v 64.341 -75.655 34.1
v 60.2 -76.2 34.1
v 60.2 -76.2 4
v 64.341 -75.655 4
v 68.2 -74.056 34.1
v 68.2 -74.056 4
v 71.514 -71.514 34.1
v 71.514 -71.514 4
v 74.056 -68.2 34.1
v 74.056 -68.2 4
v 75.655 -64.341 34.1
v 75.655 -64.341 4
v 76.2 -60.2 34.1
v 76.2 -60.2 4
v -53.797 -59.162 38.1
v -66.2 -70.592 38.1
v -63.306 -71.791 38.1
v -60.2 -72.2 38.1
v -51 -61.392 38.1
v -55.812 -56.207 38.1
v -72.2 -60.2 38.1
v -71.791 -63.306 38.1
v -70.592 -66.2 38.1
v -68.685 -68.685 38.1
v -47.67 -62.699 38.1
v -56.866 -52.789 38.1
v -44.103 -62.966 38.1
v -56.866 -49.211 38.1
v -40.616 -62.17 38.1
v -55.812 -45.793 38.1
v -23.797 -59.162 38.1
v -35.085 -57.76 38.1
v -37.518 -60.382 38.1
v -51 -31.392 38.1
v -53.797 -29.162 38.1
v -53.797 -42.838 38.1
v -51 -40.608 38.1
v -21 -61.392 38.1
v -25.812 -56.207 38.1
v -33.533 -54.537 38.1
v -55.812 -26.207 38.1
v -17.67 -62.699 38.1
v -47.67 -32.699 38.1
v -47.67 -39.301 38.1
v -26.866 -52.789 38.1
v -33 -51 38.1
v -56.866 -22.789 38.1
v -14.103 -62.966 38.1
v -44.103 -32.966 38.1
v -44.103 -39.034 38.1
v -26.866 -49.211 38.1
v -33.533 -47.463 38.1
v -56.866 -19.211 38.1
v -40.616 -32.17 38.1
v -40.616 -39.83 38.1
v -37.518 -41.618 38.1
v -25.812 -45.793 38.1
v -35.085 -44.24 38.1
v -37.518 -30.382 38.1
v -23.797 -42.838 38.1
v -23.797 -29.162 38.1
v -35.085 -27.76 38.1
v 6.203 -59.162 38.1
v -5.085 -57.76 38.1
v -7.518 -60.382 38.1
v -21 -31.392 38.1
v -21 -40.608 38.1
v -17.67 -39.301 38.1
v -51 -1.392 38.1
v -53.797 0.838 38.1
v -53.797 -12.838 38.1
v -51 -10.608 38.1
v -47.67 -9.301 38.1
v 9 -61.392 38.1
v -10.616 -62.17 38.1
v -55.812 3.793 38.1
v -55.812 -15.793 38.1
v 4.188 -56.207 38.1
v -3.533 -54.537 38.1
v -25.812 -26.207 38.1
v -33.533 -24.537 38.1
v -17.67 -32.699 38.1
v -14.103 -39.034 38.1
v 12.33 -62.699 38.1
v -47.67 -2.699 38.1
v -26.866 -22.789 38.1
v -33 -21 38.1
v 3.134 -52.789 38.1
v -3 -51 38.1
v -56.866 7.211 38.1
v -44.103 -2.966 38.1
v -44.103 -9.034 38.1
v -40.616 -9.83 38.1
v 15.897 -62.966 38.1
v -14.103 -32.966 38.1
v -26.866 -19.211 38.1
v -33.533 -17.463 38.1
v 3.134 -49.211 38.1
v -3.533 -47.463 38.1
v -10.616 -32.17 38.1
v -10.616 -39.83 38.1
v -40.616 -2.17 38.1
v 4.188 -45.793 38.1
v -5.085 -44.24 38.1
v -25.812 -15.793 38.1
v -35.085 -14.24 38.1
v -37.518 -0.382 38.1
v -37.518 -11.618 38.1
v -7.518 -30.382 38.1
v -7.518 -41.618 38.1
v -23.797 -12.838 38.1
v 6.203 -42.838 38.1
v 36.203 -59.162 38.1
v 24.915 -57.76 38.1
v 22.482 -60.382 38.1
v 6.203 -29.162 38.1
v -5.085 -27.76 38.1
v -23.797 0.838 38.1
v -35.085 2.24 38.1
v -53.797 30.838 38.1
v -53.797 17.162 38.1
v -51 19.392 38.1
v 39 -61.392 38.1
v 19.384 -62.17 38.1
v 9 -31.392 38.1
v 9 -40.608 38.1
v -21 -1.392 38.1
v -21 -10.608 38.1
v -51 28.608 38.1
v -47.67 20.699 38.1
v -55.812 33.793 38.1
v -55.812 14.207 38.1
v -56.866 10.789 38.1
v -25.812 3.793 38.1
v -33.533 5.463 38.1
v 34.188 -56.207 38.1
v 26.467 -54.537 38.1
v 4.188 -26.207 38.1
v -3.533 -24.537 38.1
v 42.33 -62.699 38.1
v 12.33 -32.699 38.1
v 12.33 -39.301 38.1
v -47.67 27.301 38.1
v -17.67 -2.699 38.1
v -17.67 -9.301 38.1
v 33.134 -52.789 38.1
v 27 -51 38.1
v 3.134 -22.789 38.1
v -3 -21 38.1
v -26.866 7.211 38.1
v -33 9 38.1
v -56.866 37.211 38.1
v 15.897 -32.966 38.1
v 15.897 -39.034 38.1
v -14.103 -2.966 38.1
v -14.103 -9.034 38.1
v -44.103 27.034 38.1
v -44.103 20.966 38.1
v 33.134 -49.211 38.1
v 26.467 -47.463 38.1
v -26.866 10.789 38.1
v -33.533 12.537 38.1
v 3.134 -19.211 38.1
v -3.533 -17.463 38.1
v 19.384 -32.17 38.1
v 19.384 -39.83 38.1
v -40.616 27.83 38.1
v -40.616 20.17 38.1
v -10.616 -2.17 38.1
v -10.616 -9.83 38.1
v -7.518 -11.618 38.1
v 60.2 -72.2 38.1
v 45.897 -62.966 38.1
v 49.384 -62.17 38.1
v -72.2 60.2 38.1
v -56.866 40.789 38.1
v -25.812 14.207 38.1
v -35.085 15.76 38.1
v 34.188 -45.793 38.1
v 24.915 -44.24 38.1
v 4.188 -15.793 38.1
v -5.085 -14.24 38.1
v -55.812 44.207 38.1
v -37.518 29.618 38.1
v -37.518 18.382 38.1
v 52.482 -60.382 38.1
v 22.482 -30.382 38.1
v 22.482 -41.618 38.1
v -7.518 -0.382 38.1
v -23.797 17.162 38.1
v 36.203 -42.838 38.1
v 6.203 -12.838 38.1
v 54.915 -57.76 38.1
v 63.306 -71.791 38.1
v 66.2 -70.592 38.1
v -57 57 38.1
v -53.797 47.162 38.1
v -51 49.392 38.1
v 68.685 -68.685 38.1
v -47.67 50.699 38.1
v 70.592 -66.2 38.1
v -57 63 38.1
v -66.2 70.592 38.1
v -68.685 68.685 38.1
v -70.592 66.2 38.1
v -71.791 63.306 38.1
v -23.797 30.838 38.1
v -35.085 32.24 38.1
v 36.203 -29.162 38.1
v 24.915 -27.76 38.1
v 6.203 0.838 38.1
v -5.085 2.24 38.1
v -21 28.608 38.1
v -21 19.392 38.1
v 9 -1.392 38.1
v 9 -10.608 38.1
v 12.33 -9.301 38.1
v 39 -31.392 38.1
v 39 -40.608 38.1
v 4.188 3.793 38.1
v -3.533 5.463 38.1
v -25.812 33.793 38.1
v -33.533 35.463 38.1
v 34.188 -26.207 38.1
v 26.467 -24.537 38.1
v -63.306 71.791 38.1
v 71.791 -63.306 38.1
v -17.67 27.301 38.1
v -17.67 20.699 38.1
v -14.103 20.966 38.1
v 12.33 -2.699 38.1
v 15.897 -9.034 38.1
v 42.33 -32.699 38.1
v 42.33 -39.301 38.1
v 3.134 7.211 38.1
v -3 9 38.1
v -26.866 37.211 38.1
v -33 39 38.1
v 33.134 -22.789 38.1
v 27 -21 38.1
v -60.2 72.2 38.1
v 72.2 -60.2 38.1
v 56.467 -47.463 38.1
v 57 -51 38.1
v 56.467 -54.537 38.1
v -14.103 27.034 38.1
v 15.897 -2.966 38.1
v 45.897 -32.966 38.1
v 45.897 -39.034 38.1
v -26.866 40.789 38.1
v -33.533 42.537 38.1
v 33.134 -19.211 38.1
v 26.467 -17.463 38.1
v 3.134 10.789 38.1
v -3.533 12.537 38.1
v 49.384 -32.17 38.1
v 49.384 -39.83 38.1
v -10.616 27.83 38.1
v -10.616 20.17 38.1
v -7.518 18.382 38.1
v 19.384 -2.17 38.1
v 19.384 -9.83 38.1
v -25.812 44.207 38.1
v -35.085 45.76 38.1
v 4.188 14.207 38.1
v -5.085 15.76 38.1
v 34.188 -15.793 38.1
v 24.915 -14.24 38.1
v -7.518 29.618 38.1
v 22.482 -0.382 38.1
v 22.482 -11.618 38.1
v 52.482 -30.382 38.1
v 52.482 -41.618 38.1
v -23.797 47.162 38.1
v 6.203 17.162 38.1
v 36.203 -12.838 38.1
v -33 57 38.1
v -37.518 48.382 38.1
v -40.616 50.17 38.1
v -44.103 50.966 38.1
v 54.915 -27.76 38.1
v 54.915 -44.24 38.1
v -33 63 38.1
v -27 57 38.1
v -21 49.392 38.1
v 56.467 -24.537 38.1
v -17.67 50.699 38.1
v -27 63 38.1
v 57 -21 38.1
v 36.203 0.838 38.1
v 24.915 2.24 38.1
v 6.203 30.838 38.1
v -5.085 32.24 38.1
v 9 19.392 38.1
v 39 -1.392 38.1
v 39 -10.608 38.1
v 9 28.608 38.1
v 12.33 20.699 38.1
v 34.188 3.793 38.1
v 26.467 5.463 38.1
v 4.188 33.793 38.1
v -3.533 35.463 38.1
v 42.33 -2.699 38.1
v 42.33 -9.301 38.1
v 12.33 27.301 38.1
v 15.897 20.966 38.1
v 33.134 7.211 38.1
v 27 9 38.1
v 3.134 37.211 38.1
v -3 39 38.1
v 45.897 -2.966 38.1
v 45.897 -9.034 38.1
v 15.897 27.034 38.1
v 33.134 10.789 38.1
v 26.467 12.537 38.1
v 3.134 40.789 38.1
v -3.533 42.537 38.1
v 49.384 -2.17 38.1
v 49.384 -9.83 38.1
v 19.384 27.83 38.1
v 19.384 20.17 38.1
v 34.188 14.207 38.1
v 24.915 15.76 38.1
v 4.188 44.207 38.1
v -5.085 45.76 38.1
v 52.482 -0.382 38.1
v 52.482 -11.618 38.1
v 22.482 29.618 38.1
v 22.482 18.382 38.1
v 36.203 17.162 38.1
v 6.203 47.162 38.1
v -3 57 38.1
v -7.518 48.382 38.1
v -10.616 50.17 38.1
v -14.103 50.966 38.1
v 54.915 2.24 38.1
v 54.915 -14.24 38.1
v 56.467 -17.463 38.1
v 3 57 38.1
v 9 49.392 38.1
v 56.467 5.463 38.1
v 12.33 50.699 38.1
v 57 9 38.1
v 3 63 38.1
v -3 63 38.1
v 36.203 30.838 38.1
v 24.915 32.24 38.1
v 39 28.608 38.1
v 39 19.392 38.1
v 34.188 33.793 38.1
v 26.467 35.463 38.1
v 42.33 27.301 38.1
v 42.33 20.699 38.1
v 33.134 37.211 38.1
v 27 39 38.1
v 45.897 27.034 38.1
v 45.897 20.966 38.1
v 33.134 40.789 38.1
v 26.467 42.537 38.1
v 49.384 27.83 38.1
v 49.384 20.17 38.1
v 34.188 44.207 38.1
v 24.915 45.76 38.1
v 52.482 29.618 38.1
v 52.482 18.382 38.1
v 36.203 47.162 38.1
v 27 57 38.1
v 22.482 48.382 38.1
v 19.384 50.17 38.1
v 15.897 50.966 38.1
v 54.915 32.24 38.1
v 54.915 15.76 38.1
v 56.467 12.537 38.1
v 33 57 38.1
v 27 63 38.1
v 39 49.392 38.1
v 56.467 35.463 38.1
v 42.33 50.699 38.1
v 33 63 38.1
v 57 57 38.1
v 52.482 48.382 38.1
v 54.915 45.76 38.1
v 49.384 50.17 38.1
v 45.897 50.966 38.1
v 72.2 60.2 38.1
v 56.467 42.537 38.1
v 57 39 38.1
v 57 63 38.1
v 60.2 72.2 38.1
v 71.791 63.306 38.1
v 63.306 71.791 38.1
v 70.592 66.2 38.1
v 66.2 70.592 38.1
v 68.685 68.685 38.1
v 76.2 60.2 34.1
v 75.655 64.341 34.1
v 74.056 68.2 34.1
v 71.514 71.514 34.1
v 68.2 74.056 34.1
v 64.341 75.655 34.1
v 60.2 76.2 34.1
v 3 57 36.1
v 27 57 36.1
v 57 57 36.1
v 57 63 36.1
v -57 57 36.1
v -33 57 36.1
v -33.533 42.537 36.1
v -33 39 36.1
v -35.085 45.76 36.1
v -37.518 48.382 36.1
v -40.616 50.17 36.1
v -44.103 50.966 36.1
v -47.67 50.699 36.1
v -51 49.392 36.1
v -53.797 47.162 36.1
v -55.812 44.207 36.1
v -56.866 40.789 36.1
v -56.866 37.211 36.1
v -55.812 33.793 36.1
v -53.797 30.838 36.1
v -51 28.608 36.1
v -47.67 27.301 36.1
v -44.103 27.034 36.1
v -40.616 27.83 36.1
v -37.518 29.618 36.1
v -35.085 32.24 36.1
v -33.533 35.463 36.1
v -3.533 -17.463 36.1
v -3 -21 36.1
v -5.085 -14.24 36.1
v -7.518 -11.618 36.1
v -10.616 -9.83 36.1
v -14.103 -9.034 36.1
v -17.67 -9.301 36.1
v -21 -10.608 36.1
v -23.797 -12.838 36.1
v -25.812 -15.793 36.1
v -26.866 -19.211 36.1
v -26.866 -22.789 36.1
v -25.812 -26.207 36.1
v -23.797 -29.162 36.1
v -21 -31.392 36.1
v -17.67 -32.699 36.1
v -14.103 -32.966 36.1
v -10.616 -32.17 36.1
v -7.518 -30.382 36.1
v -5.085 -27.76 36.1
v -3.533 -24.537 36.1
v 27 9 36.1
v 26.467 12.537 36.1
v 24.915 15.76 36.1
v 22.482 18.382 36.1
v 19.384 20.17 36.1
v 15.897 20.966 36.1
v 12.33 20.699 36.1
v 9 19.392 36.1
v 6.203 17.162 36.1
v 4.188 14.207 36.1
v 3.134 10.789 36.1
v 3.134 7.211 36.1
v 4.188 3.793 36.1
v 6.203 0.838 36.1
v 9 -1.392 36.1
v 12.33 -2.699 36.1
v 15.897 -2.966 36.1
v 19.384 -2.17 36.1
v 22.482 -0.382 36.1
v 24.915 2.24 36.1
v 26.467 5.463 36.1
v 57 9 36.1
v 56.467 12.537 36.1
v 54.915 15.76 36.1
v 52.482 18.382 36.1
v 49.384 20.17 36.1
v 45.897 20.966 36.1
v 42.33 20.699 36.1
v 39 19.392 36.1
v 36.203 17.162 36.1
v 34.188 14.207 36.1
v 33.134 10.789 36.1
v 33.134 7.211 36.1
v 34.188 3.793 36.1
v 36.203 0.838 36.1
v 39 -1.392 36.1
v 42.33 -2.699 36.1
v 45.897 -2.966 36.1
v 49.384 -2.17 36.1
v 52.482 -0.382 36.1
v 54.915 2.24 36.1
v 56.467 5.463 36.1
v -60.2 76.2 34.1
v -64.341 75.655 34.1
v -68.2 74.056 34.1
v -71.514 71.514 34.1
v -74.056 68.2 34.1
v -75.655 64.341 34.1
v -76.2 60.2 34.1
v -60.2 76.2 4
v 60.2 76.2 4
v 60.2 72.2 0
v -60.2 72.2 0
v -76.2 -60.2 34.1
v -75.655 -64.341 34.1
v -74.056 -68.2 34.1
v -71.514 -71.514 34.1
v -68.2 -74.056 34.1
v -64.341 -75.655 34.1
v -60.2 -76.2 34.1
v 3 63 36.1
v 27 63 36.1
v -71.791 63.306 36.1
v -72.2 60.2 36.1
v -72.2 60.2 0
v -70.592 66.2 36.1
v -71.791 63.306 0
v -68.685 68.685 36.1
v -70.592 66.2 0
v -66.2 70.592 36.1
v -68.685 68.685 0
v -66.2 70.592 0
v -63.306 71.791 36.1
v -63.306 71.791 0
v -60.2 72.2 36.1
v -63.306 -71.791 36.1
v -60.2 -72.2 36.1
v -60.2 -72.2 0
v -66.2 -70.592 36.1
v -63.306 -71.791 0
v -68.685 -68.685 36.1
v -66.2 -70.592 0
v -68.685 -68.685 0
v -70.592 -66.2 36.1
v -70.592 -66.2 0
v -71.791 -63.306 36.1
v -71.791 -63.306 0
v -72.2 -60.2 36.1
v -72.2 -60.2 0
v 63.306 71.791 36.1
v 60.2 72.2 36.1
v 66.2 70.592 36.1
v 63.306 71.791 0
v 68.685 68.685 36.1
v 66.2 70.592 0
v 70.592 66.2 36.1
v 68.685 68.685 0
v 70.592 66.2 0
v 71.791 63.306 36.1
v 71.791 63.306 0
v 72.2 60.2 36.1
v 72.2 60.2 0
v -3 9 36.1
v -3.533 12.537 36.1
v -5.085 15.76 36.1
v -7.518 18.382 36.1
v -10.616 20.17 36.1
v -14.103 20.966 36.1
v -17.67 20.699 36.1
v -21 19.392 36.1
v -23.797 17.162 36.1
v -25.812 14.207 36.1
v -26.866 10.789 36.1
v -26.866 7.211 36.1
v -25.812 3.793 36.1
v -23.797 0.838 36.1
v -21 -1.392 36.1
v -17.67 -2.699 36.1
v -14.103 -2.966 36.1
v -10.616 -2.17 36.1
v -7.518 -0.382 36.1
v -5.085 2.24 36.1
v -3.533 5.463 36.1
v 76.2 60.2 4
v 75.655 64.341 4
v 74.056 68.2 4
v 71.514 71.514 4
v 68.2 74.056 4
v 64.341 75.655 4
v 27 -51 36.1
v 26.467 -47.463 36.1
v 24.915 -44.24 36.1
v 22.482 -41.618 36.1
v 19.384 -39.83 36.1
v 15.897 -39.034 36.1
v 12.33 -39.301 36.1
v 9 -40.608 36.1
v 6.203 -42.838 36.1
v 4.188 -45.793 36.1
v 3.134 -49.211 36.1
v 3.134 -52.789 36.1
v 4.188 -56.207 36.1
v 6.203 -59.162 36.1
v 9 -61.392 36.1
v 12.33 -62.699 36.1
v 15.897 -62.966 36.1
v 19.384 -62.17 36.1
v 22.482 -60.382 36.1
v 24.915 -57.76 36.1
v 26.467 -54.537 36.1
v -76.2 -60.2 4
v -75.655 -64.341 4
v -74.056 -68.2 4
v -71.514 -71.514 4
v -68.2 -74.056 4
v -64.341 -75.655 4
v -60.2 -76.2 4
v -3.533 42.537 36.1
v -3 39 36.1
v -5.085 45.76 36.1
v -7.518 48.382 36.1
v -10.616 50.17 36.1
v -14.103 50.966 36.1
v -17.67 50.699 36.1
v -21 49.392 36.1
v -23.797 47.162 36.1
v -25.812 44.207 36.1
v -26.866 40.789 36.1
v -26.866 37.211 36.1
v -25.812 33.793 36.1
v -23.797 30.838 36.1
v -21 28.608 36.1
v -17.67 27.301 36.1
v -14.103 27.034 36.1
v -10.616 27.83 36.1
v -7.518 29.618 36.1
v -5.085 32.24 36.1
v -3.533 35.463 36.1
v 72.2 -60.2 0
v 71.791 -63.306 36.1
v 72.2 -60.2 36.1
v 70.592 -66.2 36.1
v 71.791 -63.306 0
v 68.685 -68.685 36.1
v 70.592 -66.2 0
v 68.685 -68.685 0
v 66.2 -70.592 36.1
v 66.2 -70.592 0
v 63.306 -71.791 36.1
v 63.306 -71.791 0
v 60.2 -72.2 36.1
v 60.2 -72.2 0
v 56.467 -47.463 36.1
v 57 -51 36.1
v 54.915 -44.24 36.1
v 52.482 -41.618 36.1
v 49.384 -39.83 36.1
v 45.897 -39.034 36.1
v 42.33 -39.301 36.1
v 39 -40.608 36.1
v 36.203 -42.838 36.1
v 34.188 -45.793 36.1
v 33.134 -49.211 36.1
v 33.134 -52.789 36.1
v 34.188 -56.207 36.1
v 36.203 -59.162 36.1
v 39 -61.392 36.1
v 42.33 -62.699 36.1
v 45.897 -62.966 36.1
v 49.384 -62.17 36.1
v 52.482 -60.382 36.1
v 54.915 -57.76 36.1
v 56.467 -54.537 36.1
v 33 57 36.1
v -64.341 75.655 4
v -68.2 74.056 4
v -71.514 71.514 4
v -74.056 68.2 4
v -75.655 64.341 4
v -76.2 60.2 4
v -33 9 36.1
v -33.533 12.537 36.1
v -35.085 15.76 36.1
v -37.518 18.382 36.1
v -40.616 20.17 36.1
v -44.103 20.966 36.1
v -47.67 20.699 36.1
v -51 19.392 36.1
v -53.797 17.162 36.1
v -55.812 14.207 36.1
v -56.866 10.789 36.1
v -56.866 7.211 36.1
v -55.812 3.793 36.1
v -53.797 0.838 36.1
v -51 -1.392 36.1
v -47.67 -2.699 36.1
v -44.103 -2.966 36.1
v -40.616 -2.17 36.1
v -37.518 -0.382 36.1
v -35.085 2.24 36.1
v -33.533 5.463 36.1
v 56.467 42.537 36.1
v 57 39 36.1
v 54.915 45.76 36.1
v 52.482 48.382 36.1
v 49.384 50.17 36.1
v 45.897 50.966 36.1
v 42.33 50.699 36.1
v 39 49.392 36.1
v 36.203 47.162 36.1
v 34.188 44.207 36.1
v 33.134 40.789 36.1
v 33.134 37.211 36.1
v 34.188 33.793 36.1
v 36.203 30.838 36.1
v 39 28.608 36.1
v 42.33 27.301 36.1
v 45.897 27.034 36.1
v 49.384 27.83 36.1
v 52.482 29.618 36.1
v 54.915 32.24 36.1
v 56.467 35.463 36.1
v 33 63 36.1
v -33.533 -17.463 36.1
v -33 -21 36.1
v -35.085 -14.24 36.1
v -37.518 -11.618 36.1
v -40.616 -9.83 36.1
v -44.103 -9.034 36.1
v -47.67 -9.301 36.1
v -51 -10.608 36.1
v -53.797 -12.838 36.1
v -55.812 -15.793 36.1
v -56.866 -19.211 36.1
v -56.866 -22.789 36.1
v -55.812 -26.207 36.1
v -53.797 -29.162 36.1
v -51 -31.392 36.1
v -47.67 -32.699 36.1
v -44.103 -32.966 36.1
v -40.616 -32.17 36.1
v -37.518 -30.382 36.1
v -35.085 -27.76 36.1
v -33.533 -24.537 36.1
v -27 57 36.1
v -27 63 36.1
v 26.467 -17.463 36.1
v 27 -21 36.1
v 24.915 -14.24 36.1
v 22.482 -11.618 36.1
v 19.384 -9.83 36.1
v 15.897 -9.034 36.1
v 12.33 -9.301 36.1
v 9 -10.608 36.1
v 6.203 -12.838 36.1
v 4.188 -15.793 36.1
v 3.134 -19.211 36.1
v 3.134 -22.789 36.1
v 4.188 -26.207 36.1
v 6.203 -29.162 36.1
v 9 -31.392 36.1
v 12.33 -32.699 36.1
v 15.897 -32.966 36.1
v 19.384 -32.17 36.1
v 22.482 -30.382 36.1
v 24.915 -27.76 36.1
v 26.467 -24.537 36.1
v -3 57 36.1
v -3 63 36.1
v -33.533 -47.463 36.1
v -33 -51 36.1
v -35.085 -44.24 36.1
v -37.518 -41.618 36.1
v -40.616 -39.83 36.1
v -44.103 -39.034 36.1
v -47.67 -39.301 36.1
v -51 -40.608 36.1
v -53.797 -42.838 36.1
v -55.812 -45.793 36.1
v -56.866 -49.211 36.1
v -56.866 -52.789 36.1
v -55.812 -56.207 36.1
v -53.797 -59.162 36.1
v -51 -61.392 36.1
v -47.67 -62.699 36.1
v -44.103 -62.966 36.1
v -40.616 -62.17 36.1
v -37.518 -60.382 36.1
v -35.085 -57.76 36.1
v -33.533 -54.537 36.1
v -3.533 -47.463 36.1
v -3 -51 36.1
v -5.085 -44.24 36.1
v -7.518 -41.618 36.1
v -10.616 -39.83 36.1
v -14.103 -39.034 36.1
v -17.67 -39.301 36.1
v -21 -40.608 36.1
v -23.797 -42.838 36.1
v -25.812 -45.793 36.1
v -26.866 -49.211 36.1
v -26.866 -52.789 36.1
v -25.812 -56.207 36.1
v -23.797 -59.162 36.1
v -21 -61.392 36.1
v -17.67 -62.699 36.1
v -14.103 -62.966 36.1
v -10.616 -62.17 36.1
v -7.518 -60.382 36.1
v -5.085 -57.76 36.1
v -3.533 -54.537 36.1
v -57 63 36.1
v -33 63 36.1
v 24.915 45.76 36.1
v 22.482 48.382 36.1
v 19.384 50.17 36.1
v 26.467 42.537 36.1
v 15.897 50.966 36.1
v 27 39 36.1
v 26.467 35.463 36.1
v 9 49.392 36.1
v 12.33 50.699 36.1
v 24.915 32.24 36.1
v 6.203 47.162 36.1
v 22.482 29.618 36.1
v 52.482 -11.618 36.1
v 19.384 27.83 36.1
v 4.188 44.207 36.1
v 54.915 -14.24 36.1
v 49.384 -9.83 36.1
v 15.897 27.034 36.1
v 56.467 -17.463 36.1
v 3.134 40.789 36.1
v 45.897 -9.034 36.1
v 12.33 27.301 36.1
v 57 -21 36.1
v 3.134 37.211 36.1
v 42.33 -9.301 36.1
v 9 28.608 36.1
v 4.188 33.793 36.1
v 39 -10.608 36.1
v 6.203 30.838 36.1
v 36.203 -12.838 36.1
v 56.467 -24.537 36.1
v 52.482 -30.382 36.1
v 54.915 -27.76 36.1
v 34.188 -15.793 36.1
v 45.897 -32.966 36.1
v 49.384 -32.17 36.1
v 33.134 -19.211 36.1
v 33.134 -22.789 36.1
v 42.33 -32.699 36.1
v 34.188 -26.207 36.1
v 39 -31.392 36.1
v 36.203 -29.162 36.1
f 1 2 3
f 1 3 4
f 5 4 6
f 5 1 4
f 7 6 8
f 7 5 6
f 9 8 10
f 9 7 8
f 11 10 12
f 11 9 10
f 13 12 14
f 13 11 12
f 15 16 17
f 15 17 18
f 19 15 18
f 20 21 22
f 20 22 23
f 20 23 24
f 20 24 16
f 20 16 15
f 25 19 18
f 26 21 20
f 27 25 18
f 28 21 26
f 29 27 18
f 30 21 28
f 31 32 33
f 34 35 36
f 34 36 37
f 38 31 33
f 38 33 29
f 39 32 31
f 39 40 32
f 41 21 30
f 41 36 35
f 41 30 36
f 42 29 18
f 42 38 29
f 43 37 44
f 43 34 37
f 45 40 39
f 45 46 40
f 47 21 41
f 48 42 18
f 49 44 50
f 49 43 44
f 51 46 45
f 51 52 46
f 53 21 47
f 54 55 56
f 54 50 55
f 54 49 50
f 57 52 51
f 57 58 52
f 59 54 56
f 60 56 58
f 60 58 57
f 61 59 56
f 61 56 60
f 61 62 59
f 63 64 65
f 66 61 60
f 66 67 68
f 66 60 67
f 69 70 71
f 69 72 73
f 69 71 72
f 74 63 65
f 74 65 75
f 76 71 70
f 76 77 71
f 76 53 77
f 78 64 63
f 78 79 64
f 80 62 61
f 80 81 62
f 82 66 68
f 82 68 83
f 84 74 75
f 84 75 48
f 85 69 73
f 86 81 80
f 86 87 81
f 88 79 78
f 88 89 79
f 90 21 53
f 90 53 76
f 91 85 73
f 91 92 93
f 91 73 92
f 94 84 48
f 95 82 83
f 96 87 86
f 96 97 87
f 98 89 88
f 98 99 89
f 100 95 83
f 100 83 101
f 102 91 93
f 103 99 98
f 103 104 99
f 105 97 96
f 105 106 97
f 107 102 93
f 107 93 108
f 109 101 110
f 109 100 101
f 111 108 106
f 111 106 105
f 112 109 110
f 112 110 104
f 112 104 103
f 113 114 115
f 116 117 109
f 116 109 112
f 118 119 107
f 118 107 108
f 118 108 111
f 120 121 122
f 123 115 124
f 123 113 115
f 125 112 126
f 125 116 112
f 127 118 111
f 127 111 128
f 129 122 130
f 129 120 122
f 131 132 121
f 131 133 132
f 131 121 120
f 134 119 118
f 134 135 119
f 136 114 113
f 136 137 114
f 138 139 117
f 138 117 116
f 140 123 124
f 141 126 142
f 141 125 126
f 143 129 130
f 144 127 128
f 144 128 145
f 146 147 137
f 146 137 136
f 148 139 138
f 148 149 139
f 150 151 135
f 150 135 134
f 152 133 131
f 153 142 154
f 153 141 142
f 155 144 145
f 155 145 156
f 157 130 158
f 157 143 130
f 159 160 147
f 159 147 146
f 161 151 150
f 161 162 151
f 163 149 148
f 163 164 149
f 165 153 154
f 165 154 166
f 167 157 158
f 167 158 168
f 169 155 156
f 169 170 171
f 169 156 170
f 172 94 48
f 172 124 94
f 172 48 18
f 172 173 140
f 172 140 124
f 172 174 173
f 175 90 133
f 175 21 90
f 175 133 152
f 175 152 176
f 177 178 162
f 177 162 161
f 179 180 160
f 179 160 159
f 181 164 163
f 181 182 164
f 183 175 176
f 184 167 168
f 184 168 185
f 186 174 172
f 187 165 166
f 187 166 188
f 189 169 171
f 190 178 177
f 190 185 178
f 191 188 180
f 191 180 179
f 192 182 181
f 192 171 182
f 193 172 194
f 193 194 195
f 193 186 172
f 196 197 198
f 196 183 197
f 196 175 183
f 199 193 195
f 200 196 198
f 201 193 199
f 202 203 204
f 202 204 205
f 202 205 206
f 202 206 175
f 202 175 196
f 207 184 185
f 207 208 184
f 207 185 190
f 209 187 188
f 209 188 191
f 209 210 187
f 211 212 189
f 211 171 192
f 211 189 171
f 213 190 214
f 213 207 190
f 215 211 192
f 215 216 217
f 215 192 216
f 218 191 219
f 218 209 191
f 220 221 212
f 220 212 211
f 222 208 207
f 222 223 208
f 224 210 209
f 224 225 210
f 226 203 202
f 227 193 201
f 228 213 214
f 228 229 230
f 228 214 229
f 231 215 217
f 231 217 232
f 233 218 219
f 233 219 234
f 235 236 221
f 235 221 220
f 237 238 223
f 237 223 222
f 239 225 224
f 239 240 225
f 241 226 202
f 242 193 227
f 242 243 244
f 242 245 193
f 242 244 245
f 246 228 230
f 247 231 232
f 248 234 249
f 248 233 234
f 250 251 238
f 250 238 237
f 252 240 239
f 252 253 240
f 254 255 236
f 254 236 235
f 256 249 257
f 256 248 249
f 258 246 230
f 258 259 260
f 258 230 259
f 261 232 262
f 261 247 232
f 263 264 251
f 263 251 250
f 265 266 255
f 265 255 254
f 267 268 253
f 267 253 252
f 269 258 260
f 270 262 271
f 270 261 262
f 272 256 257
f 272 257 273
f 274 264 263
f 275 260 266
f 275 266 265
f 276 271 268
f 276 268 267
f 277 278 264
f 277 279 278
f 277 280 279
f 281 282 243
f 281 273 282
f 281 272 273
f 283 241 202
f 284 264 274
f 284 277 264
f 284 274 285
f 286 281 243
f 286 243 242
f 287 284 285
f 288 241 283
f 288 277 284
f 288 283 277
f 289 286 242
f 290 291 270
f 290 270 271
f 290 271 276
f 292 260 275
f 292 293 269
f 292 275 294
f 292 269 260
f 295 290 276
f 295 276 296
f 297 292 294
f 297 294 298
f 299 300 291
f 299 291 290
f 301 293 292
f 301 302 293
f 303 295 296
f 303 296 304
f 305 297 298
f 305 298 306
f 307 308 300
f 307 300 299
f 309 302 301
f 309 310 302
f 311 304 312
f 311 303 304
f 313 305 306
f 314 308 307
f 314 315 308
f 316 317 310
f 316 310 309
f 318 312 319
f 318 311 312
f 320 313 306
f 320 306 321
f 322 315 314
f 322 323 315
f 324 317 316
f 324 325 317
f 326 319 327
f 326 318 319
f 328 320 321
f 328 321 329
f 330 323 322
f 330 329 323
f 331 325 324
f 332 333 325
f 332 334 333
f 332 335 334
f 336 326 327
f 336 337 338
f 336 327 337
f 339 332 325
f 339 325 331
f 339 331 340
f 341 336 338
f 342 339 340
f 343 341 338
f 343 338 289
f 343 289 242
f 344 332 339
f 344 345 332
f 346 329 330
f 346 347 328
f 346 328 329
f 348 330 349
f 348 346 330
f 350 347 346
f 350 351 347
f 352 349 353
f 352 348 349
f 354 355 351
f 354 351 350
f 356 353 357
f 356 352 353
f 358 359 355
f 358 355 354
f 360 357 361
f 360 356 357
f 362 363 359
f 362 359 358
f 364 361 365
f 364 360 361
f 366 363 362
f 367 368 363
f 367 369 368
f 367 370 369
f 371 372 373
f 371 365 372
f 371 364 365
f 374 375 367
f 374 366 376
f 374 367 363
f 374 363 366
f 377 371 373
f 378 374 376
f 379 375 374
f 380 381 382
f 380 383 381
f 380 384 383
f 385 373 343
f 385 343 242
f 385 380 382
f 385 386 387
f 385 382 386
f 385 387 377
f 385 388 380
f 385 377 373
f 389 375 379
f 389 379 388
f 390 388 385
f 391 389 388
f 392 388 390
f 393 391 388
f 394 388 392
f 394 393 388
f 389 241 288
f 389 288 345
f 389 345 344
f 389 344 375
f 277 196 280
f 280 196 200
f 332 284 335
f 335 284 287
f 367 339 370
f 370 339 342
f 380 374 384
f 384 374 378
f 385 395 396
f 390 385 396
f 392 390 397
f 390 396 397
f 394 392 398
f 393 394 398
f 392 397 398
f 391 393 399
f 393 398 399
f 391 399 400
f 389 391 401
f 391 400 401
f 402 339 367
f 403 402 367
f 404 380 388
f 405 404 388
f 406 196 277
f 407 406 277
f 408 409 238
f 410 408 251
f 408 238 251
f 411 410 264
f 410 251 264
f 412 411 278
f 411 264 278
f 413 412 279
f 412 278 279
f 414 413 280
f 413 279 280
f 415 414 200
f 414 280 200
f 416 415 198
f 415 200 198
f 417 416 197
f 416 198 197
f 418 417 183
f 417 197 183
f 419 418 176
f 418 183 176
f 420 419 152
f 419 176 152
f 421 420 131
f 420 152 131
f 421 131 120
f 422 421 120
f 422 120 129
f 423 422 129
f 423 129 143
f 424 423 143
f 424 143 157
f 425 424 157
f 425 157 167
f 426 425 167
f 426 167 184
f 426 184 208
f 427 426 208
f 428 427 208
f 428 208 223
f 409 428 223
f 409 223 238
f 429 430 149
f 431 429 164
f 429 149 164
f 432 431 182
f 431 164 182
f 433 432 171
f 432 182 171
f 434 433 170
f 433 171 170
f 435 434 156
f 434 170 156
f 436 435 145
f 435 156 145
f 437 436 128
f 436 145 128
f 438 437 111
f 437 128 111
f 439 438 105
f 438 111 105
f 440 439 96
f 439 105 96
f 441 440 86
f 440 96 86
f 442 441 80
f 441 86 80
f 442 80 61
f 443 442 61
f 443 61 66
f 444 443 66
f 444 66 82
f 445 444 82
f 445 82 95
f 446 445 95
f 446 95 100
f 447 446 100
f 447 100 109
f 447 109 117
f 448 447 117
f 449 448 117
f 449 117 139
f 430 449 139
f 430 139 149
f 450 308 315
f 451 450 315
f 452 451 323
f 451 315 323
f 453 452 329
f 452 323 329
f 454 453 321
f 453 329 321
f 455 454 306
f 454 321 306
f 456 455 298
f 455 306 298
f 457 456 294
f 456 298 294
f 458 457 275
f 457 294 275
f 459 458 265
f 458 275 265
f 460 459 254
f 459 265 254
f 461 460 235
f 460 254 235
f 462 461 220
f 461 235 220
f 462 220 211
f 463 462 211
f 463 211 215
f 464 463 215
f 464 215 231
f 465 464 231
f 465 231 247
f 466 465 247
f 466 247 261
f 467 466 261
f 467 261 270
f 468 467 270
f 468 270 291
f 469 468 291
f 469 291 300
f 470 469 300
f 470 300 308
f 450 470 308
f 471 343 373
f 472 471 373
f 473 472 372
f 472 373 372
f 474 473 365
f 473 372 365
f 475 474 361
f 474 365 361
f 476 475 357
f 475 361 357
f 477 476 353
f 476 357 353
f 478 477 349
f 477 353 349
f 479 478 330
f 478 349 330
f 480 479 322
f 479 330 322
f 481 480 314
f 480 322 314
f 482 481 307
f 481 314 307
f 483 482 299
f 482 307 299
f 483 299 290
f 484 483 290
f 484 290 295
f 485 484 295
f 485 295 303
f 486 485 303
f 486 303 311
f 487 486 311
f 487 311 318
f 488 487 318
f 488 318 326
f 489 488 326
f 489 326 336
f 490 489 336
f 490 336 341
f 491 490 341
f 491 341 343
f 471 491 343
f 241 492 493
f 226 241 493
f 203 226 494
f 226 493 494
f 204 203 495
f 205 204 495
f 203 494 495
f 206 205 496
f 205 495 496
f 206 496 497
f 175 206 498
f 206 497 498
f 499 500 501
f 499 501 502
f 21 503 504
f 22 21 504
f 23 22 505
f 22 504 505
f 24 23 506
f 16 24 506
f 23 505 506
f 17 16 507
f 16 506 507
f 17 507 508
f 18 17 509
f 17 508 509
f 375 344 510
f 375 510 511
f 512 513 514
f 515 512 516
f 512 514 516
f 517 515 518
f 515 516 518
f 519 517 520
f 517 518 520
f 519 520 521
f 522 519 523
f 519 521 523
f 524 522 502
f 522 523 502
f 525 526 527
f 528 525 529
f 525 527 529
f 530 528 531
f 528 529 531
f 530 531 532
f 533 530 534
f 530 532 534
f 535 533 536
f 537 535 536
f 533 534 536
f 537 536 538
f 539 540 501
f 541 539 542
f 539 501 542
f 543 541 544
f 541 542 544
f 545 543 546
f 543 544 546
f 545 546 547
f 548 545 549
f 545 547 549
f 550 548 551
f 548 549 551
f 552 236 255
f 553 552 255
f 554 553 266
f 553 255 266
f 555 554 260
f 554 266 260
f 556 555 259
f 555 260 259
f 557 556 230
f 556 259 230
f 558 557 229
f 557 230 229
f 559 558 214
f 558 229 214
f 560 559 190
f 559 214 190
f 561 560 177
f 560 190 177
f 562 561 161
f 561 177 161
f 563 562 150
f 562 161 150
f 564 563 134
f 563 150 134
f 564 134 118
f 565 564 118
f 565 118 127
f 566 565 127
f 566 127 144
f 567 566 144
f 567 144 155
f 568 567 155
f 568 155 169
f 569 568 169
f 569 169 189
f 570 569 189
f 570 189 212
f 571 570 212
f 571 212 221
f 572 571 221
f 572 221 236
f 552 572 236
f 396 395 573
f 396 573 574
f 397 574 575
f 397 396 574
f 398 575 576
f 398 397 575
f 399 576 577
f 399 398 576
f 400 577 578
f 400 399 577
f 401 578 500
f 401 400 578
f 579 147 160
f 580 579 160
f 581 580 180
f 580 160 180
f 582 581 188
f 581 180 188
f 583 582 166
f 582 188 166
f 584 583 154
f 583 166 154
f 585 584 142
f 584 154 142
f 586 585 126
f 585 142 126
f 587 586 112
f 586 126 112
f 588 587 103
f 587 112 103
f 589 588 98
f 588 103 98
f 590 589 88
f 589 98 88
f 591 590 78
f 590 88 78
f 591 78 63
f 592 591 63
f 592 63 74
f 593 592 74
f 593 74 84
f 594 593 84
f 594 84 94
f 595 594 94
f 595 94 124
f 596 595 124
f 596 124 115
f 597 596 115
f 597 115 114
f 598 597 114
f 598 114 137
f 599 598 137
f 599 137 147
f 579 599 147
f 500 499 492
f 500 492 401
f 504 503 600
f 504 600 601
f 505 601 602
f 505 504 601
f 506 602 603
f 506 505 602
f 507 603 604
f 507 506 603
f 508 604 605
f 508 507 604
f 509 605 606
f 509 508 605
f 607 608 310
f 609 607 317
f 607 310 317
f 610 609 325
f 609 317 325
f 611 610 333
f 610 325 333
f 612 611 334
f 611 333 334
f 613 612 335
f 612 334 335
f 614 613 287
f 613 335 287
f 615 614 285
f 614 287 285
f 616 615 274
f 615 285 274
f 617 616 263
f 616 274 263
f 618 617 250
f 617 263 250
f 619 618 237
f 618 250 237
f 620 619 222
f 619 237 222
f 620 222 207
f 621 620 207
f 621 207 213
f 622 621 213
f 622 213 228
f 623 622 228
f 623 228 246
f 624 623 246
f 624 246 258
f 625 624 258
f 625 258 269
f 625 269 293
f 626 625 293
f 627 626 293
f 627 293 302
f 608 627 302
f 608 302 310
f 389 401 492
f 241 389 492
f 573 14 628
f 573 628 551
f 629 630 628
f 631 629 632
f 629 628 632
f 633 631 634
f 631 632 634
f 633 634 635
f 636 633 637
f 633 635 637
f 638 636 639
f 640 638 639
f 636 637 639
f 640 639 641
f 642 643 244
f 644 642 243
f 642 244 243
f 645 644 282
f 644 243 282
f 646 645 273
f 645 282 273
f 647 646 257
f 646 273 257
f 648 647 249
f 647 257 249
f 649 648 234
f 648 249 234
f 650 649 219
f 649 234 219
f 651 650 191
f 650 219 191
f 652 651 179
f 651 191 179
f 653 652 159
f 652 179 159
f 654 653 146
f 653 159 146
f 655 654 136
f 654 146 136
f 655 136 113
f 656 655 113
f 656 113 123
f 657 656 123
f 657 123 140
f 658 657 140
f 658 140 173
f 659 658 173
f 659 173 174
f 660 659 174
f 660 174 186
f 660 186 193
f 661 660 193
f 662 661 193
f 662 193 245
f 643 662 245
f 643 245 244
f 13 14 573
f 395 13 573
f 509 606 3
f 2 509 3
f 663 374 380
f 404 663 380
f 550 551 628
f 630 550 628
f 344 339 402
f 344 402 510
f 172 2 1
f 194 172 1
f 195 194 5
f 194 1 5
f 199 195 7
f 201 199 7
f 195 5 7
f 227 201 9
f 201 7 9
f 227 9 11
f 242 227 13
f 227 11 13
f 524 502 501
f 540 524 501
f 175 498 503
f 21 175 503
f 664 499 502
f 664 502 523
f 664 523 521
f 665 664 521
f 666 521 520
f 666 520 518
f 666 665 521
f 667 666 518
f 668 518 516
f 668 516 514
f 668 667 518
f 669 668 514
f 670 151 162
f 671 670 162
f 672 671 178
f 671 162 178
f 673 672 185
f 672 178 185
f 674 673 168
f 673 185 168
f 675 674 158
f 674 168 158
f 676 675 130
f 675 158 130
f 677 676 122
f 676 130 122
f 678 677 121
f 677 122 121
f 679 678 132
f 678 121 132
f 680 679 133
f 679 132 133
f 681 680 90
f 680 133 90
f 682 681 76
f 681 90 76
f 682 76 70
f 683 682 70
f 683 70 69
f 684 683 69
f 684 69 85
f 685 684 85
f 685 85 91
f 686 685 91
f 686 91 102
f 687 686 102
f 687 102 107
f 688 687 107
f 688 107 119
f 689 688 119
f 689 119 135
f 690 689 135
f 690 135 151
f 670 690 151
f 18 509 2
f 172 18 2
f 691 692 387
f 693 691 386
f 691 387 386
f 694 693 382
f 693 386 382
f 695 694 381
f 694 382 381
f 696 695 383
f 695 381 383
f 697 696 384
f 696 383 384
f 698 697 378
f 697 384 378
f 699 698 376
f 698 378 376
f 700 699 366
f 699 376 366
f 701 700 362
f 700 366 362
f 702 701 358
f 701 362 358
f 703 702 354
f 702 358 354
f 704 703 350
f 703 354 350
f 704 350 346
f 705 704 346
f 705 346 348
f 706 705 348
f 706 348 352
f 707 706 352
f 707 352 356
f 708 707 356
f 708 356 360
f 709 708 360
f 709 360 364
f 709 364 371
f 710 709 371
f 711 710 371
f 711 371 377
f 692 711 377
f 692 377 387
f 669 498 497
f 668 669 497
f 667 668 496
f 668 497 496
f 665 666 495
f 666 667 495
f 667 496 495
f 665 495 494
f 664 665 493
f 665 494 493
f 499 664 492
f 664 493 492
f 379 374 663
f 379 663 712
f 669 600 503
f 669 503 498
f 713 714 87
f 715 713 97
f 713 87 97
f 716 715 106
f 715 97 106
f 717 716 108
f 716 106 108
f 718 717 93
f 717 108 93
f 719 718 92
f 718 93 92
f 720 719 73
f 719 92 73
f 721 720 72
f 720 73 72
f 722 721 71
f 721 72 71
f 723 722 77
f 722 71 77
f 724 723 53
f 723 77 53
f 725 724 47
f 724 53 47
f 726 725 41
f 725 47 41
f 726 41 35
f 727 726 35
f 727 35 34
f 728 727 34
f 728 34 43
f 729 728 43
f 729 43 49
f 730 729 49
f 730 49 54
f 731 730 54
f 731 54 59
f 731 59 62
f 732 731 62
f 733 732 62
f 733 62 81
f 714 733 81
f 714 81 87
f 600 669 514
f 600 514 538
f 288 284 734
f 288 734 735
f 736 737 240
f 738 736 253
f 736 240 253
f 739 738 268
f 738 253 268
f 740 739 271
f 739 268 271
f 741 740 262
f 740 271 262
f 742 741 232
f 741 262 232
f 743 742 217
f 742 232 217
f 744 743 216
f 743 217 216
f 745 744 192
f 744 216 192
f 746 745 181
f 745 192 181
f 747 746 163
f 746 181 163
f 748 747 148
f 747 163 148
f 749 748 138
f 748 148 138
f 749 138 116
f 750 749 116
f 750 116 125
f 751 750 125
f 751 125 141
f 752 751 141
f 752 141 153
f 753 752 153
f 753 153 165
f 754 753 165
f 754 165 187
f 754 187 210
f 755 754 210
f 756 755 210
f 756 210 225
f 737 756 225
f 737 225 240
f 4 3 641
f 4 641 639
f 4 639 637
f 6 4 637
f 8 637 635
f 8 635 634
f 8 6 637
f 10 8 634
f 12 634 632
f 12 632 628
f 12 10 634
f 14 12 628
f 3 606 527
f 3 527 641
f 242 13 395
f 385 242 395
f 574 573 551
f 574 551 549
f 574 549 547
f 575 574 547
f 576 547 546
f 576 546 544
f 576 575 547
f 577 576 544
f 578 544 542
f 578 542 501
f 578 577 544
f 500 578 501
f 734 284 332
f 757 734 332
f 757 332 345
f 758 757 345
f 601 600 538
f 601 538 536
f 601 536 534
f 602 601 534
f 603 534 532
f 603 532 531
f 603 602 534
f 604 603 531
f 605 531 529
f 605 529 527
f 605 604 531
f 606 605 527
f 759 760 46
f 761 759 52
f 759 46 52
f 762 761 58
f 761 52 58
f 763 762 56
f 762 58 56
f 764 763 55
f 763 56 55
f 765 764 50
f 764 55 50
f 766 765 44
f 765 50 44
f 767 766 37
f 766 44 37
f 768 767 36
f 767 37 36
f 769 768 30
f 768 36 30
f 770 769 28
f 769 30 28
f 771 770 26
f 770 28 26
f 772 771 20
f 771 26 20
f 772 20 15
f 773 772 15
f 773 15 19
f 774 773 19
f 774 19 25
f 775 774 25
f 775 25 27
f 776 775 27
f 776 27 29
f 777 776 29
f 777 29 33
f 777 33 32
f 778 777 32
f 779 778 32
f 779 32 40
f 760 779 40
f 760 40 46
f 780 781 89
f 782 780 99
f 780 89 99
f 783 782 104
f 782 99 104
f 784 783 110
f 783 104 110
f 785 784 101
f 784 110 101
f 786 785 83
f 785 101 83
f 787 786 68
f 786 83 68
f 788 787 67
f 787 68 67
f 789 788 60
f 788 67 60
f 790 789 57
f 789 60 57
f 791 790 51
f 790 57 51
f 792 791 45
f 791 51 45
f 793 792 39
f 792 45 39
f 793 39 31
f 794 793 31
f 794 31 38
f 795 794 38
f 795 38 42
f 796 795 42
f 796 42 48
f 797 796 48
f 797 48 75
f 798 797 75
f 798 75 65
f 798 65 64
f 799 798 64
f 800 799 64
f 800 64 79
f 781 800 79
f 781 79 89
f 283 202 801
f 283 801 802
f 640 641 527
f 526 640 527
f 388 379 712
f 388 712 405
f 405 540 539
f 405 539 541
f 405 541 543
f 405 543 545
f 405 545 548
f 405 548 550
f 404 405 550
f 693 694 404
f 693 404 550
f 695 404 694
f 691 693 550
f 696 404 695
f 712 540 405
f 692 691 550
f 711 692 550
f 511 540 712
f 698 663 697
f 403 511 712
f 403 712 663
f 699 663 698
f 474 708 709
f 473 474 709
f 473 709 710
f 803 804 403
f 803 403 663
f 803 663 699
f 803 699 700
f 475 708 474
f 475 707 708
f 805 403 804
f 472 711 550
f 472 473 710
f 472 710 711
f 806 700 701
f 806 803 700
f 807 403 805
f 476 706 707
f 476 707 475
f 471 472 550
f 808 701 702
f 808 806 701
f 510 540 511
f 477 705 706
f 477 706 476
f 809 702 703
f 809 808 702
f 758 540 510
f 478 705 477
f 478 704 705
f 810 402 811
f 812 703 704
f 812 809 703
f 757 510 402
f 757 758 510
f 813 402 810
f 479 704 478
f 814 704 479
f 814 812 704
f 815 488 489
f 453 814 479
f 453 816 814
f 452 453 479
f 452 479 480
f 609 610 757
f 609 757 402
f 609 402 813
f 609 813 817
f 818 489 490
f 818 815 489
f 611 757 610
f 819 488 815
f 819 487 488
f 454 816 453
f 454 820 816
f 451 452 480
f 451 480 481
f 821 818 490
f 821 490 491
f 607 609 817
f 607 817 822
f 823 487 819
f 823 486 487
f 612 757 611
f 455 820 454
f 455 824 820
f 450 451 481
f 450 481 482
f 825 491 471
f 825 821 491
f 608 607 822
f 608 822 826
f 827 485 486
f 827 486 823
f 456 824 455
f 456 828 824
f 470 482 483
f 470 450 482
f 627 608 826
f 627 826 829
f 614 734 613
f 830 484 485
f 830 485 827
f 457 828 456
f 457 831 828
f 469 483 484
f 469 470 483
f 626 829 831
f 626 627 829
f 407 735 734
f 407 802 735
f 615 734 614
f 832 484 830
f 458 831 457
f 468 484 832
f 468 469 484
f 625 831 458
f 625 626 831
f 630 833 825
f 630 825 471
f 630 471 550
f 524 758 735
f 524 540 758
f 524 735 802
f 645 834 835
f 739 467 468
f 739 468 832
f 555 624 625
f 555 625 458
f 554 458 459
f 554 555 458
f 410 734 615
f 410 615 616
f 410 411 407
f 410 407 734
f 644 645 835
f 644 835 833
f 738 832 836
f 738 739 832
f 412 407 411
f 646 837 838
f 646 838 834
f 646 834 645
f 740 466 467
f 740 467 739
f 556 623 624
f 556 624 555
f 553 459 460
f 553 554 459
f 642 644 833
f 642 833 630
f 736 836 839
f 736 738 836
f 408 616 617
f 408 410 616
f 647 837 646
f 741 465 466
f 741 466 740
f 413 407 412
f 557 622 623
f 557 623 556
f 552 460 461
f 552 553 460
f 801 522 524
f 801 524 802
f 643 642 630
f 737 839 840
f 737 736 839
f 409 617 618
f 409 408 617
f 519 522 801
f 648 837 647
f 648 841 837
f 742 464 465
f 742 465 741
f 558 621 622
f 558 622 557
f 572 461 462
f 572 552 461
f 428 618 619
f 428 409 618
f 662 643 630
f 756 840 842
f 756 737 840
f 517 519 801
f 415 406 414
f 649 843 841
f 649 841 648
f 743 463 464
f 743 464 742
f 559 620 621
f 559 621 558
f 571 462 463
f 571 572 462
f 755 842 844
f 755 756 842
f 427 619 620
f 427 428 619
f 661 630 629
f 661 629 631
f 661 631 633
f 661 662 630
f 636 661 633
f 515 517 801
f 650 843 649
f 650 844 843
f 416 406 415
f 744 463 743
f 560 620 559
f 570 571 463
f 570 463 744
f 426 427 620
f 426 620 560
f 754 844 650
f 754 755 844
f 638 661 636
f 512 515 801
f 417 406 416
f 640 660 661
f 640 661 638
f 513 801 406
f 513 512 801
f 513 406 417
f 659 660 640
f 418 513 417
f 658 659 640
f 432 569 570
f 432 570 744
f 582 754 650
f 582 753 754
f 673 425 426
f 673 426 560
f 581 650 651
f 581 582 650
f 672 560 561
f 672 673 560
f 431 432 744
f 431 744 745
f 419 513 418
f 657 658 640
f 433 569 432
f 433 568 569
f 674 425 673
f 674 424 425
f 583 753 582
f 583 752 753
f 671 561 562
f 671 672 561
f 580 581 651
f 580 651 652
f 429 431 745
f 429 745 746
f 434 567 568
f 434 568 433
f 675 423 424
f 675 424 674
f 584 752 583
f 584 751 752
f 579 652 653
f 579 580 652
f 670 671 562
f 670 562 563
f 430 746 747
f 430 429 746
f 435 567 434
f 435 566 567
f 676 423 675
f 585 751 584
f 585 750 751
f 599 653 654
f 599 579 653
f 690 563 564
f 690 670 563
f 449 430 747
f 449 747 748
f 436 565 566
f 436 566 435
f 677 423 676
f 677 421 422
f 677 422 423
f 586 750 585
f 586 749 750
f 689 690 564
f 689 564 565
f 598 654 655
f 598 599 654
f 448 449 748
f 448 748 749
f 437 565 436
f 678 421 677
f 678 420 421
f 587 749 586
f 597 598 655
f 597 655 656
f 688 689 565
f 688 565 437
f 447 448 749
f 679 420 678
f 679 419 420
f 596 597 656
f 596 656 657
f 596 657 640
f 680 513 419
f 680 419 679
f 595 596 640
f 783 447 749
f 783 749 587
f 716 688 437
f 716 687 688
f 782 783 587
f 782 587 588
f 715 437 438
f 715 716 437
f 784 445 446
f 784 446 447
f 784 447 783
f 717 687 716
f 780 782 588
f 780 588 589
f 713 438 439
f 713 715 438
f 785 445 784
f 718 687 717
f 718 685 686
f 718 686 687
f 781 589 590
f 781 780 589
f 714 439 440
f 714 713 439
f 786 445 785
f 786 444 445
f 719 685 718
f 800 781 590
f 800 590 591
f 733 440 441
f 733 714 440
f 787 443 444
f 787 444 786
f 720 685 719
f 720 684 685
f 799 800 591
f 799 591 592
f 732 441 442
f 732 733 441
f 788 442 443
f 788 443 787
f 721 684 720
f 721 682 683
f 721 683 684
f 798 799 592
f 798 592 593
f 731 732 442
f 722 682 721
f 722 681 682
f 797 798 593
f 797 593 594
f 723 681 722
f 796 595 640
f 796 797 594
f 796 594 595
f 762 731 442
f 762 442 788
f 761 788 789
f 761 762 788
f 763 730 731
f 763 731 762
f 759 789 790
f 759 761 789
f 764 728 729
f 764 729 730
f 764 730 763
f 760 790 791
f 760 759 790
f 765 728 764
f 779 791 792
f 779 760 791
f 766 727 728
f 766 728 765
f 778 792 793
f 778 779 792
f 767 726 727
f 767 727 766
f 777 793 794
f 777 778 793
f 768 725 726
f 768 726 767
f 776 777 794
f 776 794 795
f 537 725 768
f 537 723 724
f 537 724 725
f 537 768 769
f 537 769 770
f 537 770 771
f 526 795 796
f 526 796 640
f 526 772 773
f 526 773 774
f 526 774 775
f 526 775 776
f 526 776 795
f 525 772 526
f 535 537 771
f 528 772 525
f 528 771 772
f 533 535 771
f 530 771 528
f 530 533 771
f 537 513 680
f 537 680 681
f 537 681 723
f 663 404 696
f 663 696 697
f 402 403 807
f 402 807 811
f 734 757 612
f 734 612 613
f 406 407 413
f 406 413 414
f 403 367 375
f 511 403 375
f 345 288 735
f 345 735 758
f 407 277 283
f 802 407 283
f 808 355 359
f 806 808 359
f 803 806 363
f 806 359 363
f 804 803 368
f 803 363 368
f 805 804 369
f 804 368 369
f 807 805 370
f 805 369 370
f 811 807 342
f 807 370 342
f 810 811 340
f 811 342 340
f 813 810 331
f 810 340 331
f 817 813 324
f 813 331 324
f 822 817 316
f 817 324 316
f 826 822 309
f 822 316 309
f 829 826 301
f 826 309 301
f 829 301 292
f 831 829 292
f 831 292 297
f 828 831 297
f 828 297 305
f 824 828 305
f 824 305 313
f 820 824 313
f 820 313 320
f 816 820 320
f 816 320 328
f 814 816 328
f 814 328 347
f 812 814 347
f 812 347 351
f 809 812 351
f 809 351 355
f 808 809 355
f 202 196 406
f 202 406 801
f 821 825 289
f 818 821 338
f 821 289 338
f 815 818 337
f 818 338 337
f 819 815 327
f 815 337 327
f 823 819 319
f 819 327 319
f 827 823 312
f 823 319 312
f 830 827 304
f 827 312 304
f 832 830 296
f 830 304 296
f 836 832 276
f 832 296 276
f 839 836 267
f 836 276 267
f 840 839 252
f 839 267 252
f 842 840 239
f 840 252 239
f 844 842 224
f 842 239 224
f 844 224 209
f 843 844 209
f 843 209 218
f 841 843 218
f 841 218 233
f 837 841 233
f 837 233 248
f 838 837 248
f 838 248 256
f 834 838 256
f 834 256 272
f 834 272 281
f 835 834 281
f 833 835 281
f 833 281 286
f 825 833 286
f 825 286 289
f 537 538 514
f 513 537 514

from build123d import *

# Parameters (mm, degrees)
SKETCH_W        = 152.4
SKETCH_H        = 152.4
PAD_DEPTH       = 38.1
FILLET_R        = 16
CHAMFER_SIZE    = 4
SKETCH001_R     = 12
SKETCH001_W     = 24
SKETCH001_H     = 6
POCKET_DEPTH    = 38.101
POCKET_FACE9_R  = 12
POCKET_FACE9_W  = 6
POCKET_FACE9_H  = 24
POCKET001_DEPTH = 36.1


with BuildPart() as part:
    # Sketch → Pad (new body)
    with BuildSketch(Plane.XY):
        Rectangle(SKETCH_W, SKETCH_H)
    extrude(amount=PAD_DEPTH)

    # Fillet
    fillet_edges = [part.edges().sort_by_distance(p)[0] for p in [
        (-76.2, 76.2, 19.05),
        (-76.2, -76.2, 19.05),
        (76.2, -76.2, 19.05),
        (76.2, 76.2, 19.05),
    ]]
    fillet(fillet_edges, radius=FILLET_R)

    # Chamfer
    chamfer_edges = [part.edges().sort_by_distance(p)[0] for p in [
        (0, -76.2, 0),
        (0, -76.2, 38.1),
    ]]
    chamfer(chamfer_edges, length=CHAMFER_SIZE)

    # Sketch001 (on Face11 of Chamfer) → Pocket (cut, through all)
    with BuildSketch(Plane.XY.offset(38.1)):
        with Locations((-45, -51)):
            Circle(SKETCH001_R)
        with Locations((-45, -21)):
            Circle(SKETCH001_R)
        with Locations((-45, 9)):
            Circle(SKETCH001_R)
        with Locations((-45, 39)):
            Circle(SKETCH001_R)
        with Locations((-15, -51)):
            Circle(SKETCH001_R)
        with Locations((-15, -21)):
            Circle(SKETCH001_R)
        with Locations((-15, 9)):
            Circle(SKETCH001_R)
        with Locations((-15, 39)):
            Circle(SKETCH001_R)
        with Locations((15, -51)):
            Circle(SKETCH001_R)
        with Locations((15, -21)):
            Circle(SKETCH001_R)
        with Locations((15, 9)):
            Circle(SKETCH001_R)
        with Locations((15, 39)):
            Circle(SKETCH001_R)
        with Locations((45, -51)):
            Circle(SKETCH001_R)
        with Locations((45, -21)):
            Circle(SKETCH001_R)
        with Locations((45, 9)):
            Circle(SKETCH001_R)
        with Locations((45, 39)):
            Circle(SKETCH001_R)
        with Locations((-45, 60)):
            Rectangle(SKETCH001_W, SKETCH001_H)
        with Locations((-15, 60)):
            Rectangle(SKETCH001_W, SKETCH001_H)
        with Locations((15, 60)):
            Rectangle(SKETCH001_W, SKETCH001_H)
        with Locations((45, 60)):
            Rectangle(SKETCH001_W, SKETCH001_H)
    extrude(amount=-POCKET_DEPTH, mode=Mode.SUBTRACT)

    # Pocket Face9 → Pocket001 (cut)
    with BuildSketch(Plane(origin=(0, 0.686829, 0), x_dir=(0, -1, 0), z_dir=(0, 0, -1))):
        with BuildLine():
            Line((72.886829, -60.2), (72.886829, 60.2))
            ThreePointArc((72.886829, 60.2), (69.37211, 68.685281), (60.886829, 72.2))
            Line((60.886829, 72.2), (-59.513171, 72.2))
            ThreePointArc((-59.513171, 72.2), (-67.998453, 68.685281), (-71.513171, 60.2))
            Line((-71.513171, 60.2), (-71.513171, -60.2))
            ThreePointArc((-71.513171, -60.2), (-67.998453, -68.685281), (-59.513171, -72.2))
            Line((-59.513171, -72.2), (60.886829, -72.2))
            ThreePointArc((60.886829, -72.2), (69.37211, -68.685281), (72.886829, -60.2))
        make_face()
        with Locations((-38.313171, 45)):
            Circle(POCKET_FACE9_R, mode=Mode.SUBTRACT)
        with Locations((-8.313171, 45)):
            Circle(POCKET_FACE9_R, mode=Mode.SUBTRACT)
        with Locations((-8.313171, 15)):
            Circle(POCKET_FACE9_R, mode=Mode.SUBTRACT)
        with Locations((-38.313171, 15)):
            Circle(POCKET_FACE9_R, mode=Mode.SUBTRACT)
        with Locations((-38.313171, -15)):
            Circle(POCKET_FACE9_R, mode=Mode.SUBTRACT)
        with Locations((21.686829, 45)):
            Circle(POCKET_FACE9_R, mode=Mode.SUBTRACT)
        with Locations((21.686829, -45)):
            Circle(POCKET_FACE9_R, mode=Mode.SUBTRACT)
        with Locations((-8.313171, -45)):
            Circle(POCKET_FACE9_R, mode=Mode.SUBTRACT)
        with Locations((21.686829, -15)):
            Circle(POCKET_FACE9_R, mode=Mode.SUBTRACT)
        with Locations((-8.313171, -15)):
            Circle(POCKET_FACE9_R, mode=Mode.SUBTRACT)
        with Locations((21.686829, 15)):
            Circle(POCKET_FACE9_R, mode=Mode.SUBTRACT)
        with Locations((-38.313171, -45)):
            Circle(POCKET_FACE9_R, mode=Mode.SUBTRACT)
        with Locations((-59.313171, 45)):
            Rectangle(POCKET_FACE9_W, POCKET_FACE9_H, mode=Mode.SUBTRACT)
        with Locations((-59.313171, 15)):
            Rectangle(POCKET_FACE9_W, POCKET_FACE9_H, mode=Mode.SUBTRACT)
        with Locations((-59.313171, -15)):
            Rectangle(POCKET_FACE9_W, POCKET_FACE9_H, mode=Mode.SUBTRACT)
        with Locations((-59.313171, -45)):
            Rectangle(POCKET_FACE9_W, POCKET_FACE9_H, mode=Mode.SUBTRACT)
        with Locations((51.686829, 15)):
            Circle(POCKET_FACE9_R, mode=Mode.SUBTRACT)
        with Locations((51.686829, -15)):
            Circle(POCKET_FACE9_R, mode=Mode.SUBTRACT)
        with Locations((51.686829, -45)):
            Circle(POCKET_FACE9_R, mode=Mode.SUBTRACT)
        with Locations((51.686829, 45)):
            Circle(POCKET_FACE9_R, mode=Mode.SUBTRACT)
    extrude(amount=-POCKET001_DEPTH, mode=Mode.SUBTRACT)


solid = part.part
